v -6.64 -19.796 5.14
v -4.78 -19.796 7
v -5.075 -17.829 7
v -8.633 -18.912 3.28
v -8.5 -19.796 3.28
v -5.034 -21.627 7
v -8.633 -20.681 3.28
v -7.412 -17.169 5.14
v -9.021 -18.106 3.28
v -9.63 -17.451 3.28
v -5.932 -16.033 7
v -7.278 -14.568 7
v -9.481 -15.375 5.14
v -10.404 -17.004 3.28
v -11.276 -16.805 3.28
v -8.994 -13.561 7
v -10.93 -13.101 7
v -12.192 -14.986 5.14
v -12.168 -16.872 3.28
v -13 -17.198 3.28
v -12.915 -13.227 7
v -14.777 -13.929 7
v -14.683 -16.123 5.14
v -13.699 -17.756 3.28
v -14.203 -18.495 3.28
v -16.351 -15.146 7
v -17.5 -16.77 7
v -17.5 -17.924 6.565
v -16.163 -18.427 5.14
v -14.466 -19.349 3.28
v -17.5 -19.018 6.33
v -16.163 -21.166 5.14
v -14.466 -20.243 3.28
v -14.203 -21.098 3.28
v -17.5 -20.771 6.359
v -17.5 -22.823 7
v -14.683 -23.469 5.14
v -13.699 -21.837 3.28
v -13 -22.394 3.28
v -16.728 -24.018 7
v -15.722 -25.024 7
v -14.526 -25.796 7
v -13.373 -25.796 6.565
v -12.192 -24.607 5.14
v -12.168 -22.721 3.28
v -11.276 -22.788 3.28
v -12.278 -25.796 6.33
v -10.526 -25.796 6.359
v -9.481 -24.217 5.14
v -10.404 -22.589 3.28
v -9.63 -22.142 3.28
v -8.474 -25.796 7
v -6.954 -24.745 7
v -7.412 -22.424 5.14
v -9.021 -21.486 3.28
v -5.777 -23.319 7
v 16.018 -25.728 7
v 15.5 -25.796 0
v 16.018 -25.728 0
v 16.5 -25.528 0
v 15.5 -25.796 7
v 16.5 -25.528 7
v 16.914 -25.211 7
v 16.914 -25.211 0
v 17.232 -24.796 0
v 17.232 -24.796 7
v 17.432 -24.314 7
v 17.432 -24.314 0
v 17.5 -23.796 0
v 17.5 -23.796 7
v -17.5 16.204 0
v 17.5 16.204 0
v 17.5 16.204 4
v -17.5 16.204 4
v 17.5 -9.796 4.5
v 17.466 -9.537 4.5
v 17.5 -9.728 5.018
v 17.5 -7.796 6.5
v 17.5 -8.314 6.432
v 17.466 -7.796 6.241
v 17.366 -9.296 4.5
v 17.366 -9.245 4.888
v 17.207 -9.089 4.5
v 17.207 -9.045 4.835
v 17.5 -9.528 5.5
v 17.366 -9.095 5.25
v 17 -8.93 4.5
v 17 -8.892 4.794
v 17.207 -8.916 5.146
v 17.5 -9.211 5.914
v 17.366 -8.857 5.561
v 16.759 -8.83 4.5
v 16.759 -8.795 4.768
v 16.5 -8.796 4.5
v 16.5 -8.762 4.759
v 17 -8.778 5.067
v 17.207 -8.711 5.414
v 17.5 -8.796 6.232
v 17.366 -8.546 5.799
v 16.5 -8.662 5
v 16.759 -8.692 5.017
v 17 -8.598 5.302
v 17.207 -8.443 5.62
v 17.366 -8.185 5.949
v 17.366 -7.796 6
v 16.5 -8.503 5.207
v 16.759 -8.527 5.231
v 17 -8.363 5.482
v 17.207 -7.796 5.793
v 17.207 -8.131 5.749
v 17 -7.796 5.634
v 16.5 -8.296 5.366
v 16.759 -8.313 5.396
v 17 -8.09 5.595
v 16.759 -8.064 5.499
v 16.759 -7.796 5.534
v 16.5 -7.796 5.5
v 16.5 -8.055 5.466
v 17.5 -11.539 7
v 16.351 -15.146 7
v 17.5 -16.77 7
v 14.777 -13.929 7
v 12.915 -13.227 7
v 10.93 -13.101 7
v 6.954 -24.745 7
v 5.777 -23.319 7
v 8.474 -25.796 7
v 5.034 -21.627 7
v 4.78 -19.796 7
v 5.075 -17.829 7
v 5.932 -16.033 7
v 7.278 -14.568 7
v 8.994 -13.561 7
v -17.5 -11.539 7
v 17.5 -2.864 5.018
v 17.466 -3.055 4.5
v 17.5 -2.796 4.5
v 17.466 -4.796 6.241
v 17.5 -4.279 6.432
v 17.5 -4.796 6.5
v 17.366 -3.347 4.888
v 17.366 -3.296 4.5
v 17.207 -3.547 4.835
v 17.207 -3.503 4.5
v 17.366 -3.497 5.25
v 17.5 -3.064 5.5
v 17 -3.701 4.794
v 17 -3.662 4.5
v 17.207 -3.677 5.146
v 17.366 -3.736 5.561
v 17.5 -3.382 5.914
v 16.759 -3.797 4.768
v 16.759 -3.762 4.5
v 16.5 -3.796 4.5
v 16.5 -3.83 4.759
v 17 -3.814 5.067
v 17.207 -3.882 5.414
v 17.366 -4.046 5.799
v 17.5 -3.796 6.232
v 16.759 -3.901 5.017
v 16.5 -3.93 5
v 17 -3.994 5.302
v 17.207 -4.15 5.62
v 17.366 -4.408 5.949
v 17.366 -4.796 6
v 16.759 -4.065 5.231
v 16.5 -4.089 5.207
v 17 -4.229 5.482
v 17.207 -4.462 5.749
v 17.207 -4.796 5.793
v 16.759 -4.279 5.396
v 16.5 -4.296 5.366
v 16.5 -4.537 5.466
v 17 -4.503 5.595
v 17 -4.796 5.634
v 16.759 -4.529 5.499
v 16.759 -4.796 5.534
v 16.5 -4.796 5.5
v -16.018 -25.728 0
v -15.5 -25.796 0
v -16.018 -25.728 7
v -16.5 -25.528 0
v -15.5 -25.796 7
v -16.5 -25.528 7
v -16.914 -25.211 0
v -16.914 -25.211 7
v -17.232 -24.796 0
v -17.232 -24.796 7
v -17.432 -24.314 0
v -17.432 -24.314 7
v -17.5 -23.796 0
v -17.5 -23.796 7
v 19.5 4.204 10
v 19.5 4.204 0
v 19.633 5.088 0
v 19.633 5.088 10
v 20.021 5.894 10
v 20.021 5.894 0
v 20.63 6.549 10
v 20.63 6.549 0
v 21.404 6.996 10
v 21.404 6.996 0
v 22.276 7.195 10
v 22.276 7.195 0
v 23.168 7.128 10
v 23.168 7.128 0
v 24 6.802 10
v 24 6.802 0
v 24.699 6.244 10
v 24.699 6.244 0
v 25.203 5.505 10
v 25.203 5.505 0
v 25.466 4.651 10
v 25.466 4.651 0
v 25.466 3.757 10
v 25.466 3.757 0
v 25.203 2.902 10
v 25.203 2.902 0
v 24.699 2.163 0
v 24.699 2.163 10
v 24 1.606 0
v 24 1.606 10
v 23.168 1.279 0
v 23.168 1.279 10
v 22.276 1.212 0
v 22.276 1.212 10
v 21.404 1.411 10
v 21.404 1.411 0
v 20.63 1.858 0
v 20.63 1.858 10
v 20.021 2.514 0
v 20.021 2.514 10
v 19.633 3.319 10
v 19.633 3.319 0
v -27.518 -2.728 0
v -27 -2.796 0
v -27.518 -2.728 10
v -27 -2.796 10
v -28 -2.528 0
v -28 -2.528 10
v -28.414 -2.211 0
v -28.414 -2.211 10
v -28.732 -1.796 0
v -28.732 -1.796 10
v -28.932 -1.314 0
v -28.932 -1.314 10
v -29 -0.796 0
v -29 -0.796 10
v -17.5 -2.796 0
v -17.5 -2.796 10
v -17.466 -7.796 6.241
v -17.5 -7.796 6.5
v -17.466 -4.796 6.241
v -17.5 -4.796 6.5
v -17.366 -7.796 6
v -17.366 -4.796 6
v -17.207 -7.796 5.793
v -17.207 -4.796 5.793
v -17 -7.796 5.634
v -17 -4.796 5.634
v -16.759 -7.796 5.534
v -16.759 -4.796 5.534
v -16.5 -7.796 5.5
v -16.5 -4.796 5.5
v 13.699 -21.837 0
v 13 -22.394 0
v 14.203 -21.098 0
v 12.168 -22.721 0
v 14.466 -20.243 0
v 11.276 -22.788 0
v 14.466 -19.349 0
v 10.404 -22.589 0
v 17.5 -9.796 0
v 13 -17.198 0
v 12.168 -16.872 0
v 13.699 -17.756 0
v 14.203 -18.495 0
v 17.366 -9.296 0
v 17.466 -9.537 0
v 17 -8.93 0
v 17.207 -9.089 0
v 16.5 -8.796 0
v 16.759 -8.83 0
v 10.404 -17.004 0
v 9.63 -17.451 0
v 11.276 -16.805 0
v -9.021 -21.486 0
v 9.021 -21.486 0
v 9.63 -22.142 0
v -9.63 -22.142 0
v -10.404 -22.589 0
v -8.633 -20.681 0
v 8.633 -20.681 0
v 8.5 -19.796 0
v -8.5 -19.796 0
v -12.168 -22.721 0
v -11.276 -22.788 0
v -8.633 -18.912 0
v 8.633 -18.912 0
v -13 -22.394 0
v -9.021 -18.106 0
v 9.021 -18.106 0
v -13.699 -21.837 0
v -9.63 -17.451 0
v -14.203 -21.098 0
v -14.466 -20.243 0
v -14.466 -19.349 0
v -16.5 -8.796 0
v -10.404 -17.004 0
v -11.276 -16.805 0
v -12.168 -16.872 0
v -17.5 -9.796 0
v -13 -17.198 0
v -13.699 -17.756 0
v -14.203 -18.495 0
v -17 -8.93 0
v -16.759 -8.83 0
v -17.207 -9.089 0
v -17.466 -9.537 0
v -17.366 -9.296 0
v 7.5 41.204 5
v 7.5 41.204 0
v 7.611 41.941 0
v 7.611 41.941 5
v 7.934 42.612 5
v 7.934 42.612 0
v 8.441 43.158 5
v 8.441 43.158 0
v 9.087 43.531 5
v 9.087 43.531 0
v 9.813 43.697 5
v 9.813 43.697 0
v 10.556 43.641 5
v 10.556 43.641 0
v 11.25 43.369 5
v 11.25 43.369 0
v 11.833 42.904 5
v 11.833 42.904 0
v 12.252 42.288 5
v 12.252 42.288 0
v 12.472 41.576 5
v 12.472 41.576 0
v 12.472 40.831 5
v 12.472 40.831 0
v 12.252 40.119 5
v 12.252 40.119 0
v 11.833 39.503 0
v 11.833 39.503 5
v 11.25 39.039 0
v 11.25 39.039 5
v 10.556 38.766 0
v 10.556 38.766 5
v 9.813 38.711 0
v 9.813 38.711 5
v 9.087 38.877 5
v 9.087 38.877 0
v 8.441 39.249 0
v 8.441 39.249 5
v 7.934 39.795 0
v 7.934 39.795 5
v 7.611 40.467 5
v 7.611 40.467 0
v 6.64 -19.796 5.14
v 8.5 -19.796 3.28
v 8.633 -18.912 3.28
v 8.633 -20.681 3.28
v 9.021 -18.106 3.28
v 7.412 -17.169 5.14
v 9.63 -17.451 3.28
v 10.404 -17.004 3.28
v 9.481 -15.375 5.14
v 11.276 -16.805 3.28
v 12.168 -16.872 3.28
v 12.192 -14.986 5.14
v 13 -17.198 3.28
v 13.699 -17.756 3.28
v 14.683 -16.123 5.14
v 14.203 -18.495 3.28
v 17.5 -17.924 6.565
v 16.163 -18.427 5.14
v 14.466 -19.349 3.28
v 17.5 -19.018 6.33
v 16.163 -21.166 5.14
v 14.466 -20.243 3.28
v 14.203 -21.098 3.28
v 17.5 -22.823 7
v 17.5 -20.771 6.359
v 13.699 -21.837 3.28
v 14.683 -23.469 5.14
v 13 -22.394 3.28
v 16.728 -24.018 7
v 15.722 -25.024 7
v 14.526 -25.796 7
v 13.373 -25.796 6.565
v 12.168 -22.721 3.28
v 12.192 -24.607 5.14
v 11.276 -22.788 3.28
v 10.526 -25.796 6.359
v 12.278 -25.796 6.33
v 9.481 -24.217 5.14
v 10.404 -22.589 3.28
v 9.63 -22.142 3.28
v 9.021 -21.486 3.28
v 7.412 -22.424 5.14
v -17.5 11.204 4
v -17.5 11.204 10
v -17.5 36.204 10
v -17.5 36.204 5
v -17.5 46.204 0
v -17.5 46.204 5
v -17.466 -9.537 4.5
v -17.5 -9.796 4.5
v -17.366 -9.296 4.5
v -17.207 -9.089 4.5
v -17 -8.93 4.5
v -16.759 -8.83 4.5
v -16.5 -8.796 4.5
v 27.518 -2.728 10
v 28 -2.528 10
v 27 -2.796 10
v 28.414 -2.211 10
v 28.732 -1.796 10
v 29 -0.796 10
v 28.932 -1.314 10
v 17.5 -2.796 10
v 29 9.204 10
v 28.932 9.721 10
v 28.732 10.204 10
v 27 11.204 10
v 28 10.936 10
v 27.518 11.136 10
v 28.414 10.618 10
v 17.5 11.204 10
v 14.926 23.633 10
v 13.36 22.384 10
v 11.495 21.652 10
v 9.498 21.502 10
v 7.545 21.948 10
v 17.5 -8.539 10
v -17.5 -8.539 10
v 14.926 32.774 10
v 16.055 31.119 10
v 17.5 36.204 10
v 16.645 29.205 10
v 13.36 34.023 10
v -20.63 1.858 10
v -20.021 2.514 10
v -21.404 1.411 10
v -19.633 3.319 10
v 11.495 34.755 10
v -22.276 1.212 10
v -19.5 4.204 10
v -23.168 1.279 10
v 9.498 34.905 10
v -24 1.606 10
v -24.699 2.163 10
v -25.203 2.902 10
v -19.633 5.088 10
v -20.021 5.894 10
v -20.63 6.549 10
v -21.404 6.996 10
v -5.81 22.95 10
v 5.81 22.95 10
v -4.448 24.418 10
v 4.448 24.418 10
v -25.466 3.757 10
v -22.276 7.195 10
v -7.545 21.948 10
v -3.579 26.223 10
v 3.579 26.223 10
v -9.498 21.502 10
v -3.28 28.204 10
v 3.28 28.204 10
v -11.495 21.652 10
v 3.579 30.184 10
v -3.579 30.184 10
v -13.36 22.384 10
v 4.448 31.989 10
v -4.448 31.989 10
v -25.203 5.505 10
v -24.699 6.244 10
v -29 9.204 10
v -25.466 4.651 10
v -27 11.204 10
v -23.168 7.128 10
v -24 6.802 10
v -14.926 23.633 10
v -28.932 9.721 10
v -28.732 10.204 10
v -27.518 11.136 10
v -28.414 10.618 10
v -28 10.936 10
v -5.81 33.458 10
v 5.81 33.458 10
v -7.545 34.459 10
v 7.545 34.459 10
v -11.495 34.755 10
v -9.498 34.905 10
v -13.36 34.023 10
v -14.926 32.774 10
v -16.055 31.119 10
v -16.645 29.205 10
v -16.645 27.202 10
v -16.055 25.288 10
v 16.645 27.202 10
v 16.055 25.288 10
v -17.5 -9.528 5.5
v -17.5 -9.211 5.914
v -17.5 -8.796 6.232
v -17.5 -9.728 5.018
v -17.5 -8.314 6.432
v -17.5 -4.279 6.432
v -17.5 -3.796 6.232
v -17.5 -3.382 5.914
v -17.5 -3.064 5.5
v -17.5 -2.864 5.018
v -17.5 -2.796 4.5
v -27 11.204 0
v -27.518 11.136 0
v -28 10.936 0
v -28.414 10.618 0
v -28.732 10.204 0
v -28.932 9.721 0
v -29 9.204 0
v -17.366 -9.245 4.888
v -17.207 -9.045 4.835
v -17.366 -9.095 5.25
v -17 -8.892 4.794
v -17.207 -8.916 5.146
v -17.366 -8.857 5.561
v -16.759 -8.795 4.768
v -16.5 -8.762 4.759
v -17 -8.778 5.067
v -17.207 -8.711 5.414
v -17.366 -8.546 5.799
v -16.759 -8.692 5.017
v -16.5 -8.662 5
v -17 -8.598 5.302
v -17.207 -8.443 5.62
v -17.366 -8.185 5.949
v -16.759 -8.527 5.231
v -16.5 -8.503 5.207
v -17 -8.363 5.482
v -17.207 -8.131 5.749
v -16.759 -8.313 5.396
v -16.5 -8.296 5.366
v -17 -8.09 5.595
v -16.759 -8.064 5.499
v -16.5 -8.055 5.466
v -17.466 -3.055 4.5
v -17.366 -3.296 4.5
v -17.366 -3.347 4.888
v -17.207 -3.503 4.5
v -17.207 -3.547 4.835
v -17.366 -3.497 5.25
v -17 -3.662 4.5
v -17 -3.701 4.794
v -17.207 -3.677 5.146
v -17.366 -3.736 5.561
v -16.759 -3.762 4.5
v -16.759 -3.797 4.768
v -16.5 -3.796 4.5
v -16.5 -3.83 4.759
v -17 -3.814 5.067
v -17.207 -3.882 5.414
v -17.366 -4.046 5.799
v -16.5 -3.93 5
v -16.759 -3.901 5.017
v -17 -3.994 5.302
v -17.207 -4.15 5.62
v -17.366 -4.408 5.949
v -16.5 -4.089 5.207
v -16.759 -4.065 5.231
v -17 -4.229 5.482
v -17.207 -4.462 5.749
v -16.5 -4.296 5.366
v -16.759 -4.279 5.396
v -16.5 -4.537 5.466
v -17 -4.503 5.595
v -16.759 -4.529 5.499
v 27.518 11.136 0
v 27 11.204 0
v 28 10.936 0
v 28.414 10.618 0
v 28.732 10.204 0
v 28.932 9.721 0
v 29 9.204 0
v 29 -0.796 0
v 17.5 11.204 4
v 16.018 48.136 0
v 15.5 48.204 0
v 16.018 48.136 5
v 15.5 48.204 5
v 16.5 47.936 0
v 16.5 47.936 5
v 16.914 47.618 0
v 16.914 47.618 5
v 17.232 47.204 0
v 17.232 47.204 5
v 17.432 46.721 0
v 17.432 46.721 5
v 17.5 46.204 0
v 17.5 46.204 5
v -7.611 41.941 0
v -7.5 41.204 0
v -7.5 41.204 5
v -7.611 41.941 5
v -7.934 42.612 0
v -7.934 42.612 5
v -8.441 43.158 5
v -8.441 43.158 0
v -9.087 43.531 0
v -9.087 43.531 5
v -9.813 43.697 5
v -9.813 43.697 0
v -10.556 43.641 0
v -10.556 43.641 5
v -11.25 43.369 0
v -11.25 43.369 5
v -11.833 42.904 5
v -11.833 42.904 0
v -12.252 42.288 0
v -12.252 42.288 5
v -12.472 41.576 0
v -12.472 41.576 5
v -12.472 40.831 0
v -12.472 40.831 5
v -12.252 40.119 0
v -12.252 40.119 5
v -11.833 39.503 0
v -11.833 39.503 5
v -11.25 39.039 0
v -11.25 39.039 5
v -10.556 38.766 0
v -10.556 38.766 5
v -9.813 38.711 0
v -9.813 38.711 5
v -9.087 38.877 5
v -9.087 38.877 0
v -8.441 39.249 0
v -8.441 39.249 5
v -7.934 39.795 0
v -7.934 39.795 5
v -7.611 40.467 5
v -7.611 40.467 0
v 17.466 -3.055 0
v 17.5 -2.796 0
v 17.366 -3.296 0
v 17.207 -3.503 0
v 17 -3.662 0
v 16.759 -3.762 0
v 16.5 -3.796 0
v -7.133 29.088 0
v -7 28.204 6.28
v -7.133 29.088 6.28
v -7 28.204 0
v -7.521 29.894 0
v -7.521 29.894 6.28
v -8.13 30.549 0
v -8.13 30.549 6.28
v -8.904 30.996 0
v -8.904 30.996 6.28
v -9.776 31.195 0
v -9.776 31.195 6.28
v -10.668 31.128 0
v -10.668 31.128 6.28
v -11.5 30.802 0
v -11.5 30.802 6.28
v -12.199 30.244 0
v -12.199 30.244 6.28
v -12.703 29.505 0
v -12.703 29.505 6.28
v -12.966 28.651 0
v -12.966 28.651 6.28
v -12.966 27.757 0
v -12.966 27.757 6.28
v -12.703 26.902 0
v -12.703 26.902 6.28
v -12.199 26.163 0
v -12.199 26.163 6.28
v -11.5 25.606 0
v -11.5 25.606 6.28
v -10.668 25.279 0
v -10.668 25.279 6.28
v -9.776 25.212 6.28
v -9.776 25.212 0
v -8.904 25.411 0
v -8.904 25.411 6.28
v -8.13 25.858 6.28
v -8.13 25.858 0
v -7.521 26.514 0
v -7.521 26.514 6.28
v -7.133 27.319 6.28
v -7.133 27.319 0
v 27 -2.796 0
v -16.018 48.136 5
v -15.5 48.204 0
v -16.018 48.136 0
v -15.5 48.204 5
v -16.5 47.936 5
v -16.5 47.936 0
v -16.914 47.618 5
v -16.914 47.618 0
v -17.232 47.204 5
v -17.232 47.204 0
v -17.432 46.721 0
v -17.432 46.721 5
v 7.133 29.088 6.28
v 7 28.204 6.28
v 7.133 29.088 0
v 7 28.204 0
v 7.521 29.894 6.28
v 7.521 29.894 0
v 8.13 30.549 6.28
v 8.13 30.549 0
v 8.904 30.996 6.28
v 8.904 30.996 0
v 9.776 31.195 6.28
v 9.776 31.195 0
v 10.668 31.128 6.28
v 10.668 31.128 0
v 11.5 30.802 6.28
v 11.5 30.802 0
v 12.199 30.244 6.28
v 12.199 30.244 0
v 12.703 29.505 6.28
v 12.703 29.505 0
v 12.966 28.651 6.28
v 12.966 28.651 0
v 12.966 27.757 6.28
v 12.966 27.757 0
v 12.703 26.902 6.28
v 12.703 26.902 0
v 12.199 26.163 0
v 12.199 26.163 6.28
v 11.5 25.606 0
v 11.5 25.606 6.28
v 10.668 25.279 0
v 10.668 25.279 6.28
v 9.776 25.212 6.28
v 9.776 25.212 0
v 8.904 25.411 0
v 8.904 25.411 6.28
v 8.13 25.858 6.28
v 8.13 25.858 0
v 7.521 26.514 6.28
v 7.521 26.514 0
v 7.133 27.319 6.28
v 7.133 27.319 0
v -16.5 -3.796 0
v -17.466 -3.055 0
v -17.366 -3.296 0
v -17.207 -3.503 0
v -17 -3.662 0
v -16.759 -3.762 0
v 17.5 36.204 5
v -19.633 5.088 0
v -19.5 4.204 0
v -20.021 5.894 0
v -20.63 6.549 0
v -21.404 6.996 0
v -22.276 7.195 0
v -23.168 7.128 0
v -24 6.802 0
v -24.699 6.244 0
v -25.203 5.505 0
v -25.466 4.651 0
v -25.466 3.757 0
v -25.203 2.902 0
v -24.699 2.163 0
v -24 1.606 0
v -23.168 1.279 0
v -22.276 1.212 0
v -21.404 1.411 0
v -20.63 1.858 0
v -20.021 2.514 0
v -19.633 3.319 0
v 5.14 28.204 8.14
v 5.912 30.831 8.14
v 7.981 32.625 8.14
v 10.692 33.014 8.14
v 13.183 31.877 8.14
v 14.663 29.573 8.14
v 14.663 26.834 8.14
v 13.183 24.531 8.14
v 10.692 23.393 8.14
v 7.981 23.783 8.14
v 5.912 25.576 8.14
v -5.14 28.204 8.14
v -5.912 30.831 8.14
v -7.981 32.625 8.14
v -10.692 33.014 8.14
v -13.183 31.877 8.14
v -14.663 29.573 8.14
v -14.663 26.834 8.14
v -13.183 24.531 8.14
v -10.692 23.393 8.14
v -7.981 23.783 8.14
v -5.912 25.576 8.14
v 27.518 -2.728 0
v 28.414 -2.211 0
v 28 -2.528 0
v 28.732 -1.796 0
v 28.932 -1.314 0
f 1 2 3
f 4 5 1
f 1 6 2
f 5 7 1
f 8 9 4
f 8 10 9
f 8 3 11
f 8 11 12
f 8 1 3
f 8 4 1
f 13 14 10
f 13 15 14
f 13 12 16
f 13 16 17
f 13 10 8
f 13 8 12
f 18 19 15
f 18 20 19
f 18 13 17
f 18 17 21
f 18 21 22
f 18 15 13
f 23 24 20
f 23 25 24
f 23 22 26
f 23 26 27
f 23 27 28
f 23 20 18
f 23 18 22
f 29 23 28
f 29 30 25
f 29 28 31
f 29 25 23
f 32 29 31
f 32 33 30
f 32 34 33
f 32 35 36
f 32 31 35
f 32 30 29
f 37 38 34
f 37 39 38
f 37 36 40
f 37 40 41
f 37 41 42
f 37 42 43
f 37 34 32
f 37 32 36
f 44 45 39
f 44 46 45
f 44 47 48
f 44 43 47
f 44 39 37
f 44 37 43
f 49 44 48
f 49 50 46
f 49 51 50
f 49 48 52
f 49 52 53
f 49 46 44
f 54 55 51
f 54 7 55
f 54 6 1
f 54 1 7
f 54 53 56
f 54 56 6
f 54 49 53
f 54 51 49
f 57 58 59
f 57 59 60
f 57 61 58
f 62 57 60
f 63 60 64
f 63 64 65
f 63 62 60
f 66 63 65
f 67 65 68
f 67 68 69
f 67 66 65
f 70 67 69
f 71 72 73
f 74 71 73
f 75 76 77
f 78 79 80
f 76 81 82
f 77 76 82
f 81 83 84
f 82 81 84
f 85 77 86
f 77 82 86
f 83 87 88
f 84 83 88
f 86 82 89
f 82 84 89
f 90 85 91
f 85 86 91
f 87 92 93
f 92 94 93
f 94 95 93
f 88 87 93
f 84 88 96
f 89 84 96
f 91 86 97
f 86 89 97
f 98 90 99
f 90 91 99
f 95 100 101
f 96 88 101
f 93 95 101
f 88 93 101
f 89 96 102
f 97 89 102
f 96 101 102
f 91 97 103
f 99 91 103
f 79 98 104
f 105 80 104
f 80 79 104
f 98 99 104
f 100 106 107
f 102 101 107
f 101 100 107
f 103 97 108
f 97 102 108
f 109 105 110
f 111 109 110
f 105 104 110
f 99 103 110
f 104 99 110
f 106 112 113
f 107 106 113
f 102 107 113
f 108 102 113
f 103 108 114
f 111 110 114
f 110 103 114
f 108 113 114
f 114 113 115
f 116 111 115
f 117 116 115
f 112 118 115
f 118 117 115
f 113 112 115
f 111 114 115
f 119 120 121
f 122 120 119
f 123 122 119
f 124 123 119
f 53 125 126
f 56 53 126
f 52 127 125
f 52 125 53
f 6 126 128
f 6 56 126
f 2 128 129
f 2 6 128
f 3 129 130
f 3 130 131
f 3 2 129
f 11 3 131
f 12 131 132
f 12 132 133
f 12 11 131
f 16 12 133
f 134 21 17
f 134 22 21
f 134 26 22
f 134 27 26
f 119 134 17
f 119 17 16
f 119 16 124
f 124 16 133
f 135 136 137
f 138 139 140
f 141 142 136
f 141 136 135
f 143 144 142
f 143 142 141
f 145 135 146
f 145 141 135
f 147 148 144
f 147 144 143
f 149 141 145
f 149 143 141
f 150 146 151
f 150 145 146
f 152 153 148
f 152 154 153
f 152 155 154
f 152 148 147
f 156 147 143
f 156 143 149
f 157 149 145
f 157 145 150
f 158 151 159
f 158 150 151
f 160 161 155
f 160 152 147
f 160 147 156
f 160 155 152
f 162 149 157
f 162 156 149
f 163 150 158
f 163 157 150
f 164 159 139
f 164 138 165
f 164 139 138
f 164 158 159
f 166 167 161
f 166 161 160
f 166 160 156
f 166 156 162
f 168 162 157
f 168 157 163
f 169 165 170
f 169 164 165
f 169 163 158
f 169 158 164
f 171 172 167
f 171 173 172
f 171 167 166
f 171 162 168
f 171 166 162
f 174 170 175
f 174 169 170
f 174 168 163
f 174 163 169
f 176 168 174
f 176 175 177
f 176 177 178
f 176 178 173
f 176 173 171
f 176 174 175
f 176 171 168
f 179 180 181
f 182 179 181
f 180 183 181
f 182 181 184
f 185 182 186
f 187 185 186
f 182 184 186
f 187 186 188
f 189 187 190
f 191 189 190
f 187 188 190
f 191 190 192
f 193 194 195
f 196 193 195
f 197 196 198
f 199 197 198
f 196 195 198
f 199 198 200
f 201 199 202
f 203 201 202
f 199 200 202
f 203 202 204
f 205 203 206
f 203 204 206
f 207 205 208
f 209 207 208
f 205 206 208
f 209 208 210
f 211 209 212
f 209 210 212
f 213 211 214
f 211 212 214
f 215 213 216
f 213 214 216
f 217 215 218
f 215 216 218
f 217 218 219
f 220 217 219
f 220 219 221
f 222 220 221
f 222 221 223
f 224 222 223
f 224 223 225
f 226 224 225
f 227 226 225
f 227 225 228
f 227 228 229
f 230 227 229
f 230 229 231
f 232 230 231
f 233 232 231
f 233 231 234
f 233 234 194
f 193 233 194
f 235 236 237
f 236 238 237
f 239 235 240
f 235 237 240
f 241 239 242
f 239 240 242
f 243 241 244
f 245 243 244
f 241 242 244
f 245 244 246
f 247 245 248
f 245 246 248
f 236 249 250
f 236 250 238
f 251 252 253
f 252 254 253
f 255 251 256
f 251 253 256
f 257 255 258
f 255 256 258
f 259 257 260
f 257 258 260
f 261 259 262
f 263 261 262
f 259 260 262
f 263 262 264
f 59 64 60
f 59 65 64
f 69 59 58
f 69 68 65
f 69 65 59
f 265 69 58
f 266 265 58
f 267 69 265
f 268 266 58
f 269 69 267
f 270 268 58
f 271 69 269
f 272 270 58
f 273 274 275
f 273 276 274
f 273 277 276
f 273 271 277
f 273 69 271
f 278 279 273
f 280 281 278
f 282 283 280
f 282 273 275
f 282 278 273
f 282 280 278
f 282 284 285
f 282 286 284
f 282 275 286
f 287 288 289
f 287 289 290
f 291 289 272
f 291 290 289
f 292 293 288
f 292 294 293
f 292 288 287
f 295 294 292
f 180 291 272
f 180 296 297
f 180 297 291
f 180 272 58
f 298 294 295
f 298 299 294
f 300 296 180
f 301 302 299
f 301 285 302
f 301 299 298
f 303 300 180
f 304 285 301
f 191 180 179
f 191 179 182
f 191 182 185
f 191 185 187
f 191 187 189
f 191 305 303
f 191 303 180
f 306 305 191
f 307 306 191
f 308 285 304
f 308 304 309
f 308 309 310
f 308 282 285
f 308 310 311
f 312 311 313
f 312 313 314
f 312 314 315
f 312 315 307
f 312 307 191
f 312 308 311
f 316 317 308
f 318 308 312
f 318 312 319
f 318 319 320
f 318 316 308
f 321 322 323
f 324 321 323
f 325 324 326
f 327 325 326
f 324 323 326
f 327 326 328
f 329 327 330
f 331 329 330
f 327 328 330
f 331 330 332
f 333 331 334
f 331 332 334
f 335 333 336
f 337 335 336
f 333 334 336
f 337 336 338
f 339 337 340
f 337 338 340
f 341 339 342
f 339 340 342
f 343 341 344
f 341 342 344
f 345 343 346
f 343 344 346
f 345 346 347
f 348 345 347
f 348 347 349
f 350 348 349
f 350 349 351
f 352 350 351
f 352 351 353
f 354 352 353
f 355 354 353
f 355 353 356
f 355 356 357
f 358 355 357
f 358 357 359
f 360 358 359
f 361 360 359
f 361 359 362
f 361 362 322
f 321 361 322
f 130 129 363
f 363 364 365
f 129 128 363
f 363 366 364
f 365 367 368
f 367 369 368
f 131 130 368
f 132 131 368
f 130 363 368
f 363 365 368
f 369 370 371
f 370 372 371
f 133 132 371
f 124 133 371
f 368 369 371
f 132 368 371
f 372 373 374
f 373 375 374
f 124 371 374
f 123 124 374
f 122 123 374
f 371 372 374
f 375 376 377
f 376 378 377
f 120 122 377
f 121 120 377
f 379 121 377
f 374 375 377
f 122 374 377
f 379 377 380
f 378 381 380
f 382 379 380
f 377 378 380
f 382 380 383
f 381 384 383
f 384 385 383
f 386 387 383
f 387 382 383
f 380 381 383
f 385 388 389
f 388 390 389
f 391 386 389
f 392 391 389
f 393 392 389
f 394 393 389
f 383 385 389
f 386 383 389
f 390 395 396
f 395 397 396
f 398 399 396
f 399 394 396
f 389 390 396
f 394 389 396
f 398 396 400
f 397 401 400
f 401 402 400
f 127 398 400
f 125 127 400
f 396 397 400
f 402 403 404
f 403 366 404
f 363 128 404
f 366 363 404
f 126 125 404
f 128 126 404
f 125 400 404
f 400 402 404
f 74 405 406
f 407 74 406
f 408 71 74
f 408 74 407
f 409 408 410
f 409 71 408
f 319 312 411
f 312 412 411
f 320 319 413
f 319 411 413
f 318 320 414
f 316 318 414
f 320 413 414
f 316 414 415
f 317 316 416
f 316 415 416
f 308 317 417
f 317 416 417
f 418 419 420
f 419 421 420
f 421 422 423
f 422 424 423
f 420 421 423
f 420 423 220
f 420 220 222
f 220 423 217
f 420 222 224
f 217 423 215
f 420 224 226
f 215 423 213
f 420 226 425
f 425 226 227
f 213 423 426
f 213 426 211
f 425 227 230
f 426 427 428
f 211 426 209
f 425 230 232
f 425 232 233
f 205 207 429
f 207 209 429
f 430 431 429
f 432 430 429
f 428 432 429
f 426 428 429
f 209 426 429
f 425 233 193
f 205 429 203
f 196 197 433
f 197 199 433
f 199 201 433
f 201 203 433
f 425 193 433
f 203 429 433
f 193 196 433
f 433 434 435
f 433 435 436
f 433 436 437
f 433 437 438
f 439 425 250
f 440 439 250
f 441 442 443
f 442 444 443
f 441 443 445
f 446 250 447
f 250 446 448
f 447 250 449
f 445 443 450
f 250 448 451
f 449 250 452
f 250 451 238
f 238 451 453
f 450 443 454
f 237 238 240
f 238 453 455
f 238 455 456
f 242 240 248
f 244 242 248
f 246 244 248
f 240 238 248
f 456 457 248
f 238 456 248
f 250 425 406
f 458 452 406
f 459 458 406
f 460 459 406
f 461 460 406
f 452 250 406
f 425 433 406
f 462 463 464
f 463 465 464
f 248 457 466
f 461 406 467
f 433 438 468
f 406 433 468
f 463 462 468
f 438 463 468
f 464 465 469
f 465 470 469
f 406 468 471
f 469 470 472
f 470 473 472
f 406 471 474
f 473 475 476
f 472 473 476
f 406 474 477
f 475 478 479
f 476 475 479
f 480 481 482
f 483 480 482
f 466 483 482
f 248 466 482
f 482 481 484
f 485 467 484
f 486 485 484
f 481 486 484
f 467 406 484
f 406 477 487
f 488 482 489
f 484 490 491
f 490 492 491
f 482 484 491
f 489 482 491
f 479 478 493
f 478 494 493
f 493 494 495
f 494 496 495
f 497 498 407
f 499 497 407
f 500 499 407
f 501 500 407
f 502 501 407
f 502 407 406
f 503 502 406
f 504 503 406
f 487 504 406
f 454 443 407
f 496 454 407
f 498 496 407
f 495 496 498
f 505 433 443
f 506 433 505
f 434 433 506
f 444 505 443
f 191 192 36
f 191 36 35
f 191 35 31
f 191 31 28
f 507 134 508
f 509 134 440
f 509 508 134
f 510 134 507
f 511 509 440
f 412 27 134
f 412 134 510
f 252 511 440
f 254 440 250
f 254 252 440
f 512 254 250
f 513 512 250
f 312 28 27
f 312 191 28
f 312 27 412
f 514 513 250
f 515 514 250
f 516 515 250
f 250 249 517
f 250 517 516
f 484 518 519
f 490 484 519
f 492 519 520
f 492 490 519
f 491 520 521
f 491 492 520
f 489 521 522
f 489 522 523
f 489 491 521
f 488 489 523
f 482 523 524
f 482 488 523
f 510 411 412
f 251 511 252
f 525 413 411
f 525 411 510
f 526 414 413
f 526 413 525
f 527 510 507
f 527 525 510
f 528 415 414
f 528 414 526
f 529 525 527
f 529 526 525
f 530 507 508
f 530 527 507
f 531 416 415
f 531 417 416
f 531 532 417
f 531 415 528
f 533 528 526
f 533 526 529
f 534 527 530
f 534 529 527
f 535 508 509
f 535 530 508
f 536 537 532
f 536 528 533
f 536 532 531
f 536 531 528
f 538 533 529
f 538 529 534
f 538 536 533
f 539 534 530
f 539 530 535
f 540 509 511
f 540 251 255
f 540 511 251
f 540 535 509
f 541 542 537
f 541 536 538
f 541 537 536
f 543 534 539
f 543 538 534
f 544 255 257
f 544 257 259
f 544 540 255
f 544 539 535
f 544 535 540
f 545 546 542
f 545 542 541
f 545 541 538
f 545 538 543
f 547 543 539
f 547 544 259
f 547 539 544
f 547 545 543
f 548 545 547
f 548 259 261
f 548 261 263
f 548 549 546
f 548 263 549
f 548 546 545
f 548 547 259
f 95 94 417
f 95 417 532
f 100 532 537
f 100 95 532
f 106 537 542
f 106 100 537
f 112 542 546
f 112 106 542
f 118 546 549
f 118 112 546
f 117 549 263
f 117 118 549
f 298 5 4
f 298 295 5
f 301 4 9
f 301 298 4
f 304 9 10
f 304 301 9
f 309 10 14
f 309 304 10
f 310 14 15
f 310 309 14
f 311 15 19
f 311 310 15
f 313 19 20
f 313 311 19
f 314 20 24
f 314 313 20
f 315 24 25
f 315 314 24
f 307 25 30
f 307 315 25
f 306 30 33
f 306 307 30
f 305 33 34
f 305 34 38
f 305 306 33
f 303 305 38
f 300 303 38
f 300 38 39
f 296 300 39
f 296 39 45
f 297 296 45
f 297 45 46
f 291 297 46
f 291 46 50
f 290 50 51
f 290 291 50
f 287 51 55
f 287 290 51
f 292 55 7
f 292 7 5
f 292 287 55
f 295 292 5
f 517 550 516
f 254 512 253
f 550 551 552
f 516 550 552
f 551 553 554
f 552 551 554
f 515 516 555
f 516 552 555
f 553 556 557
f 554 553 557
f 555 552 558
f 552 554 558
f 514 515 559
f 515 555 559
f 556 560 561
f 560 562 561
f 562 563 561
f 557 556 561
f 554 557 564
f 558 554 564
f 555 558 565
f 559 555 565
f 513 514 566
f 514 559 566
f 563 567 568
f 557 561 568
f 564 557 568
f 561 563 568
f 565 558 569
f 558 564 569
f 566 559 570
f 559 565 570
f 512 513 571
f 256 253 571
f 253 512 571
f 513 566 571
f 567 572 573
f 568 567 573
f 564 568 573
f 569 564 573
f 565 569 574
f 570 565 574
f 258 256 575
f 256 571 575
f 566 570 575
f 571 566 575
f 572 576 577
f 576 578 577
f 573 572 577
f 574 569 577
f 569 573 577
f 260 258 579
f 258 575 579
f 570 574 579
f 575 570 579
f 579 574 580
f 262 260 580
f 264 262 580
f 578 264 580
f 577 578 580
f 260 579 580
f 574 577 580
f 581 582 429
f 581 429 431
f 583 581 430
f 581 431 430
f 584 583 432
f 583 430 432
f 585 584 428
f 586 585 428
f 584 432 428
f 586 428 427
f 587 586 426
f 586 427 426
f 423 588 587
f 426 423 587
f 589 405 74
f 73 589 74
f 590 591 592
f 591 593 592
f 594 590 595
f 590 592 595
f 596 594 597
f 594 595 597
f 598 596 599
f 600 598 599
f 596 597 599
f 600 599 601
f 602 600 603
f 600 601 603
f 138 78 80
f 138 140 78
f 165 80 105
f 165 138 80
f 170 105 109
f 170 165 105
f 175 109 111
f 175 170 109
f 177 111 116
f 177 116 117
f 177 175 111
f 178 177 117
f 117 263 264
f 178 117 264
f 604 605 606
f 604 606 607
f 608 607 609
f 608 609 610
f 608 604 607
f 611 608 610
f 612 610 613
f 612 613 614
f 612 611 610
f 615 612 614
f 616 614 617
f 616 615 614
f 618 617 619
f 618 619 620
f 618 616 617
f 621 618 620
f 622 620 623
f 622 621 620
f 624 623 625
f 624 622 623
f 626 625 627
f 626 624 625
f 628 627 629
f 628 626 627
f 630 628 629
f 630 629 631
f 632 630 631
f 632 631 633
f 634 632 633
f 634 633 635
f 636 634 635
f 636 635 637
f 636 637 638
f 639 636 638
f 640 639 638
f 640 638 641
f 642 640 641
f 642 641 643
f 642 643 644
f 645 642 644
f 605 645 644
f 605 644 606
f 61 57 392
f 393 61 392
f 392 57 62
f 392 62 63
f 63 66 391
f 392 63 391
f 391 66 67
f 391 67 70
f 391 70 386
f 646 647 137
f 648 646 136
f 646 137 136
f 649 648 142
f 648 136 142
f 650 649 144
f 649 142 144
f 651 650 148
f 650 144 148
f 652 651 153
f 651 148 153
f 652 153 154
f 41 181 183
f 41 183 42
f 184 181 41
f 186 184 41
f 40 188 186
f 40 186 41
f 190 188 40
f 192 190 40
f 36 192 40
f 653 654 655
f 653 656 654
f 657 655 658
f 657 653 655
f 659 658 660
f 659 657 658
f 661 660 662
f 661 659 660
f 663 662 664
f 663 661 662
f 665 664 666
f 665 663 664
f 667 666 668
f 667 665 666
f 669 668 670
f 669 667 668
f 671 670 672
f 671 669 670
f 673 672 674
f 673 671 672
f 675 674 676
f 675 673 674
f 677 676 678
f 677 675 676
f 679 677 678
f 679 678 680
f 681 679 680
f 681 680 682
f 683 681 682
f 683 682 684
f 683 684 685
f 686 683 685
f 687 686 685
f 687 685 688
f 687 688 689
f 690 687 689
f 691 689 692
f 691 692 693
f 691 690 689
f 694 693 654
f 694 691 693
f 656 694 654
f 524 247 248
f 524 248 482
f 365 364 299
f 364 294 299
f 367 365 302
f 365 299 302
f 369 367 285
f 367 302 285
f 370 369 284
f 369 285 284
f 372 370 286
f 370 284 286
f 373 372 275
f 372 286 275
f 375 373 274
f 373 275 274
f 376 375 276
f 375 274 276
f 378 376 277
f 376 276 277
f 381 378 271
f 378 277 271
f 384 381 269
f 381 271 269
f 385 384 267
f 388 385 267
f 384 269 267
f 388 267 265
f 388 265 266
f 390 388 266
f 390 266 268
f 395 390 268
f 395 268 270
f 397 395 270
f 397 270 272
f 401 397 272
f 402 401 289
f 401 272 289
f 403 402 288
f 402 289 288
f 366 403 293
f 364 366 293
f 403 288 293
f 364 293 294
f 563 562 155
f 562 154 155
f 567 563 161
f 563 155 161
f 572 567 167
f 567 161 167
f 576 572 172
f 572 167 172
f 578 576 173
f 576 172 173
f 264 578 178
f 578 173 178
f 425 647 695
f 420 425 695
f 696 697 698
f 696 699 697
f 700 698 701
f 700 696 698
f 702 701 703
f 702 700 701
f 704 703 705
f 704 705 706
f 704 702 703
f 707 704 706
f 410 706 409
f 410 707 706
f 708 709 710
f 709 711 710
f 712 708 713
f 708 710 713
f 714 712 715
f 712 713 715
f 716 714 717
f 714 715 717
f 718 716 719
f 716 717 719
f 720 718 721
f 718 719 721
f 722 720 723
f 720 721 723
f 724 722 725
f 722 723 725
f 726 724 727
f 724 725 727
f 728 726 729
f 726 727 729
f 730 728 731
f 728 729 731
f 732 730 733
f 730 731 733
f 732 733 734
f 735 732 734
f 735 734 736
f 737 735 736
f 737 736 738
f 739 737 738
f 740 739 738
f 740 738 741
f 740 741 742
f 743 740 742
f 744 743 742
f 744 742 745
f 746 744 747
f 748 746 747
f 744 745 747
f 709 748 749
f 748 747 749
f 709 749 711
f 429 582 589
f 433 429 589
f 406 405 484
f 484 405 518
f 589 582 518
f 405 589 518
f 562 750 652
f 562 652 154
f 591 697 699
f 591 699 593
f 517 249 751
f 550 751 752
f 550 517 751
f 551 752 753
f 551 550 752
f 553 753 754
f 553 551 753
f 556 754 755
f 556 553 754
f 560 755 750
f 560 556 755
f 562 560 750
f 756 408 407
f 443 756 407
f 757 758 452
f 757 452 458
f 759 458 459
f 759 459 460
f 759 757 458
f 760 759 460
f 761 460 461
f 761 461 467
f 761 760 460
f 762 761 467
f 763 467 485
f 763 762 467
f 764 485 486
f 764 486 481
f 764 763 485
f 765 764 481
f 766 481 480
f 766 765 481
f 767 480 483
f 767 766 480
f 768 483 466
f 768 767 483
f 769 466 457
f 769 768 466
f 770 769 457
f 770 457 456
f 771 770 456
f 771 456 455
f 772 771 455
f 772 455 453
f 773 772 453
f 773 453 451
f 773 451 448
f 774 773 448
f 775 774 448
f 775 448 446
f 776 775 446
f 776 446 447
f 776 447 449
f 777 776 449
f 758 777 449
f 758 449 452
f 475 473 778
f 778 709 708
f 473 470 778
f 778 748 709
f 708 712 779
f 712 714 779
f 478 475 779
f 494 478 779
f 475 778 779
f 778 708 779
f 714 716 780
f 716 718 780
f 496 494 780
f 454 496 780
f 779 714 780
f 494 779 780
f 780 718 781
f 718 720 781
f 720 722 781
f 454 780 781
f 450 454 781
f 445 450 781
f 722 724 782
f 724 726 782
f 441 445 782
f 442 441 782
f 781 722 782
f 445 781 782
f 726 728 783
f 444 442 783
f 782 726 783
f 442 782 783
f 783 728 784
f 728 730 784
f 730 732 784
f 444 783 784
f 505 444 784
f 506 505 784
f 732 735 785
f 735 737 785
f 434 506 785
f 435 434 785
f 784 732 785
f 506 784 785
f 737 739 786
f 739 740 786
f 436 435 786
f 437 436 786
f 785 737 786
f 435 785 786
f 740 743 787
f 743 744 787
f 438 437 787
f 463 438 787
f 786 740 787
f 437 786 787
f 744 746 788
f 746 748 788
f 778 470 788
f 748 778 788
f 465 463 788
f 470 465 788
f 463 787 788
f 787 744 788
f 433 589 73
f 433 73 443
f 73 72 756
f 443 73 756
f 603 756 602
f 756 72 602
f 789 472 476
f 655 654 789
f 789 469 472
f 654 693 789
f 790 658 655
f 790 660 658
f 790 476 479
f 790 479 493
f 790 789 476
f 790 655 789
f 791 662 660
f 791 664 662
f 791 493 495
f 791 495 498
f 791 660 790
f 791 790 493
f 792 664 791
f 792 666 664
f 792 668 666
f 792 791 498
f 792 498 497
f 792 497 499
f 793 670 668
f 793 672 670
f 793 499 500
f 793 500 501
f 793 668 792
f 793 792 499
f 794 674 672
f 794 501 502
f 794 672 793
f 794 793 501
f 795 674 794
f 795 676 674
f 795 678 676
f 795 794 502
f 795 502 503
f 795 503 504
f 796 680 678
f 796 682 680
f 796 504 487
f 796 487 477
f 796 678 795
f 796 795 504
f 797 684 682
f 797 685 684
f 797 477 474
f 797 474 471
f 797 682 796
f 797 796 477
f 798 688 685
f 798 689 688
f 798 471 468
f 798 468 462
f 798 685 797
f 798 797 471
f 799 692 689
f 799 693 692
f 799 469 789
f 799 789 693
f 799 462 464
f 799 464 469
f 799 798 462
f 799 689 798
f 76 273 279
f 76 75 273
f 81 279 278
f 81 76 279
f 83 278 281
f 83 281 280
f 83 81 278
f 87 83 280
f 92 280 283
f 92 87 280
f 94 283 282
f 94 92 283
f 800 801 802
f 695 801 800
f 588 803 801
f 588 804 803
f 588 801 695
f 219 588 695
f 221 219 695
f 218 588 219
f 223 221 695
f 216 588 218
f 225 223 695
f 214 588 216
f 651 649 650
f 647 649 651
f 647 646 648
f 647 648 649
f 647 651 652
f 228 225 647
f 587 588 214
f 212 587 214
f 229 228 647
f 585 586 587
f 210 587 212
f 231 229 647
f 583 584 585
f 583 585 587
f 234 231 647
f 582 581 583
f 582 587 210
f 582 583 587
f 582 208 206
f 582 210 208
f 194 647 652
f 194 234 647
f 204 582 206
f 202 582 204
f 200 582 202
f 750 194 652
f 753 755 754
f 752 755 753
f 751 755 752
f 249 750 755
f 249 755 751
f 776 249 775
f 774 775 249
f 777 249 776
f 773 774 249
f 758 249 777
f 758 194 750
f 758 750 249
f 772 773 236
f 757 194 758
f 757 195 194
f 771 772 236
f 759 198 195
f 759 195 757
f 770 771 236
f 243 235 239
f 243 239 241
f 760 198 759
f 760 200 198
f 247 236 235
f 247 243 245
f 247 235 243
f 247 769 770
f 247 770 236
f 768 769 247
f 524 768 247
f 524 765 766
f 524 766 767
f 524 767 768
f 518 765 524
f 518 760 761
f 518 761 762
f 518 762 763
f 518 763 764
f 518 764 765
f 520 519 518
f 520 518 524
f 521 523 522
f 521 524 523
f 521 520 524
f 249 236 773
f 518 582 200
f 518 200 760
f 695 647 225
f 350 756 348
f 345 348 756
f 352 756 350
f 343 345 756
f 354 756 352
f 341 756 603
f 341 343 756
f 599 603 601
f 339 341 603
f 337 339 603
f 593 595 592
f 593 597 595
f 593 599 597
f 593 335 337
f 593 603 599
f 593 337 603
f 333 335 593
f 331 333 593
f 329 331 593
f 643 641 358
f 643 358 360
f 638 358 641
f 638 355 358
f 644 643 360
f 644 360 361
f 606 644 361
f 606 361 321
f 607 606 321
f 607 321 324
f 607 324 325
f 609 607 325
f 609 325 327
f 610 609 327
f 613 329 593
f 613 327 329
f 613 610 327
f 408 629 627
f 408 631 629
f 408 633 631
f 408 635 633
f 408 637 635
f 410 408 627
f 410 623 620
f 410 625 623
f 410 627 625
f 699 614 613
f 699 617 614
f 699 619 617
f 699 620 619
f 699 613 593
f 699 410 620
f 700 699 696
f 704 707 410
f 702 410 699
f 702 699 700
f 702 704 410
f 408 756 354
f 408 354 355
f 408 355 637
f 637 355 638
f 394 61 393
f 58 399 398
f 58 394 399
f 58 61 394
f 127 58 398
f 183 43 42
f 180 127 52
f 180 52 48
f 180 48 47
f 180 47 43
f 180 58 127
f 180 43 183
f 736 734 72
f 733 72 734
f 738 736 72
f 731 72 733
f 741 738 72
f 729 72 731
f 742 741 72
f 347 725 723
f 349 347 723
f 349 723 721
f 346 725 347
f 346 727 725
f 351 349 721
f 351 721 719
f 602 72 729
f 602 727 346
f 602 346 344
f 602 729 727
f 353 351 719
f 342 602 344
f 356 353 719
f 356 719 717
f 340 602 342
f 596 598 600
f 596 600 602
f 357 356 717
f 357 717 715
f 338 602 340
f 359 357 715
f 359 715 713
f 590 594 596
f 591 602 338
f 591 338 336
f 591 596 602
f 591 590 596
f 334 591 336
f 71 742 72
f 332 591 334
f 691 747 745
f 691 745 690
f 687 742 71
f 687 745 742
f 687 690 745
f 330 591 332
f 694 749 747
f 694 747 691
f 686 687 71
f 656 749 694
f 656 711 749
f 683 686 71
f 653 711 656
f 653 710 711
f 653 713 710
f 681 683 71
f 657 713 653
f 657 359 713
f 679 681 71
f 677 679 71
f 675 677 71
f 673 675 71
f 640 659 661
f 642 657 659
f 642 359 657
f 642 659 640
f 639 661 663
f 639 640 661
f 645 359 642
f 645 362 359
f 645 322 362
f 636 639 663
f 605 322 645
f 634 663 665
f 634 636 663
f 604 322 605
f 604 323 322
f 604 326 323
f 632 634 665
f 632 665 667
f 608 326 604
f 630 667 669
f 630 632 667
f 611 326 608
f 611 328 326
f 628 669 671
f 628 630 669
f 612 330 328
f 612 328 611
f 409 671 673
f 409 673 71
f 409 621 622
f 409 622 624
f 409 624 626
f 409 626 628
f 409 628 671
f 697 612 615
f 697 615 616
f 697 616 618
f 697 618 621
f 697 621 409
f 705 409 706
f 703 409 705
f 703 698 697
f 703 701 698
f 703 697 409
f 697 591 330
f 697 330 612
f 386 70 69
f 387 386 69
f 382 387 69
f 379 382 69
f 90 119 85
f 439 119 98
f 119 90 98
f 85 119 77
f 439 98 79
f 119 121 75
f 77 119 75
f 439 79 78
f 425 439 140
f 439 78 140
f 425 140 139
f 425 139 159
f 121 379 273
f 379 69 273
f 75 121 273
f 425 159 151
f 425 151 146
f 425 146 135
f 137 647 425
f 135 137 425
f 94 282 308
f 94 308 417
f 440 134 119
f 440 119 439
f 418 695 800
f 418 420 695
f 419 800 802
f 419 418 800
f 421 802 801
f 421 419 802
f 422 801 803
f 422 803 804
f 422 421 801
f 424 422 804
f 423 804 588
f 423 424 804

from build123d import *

# Parameters (mm, degrees)
F0_W            = 11.5
F0_H            = 14
F1_DEPTH        = 10
F2_W            = 5
F2_H            = 5.5
F2_H_2          = 4
F2_W_2          = 12
F2_H_3          = 5
F3_DEPTH        = 17.501
F7_D            = 5
F8_D            = 6
F9_D            = 6
F9_CSINK_D      = 13.44
F9_CSINK_ANGLE  = 90
F11_D           = 6
F11_CSINK_D     = 13.44
F11_CSINK_ANGLE = 90
F12_R           = 2
F13_R           = 0.99999


# Not quite as in the source:
# - a fillet or chamfer is up to 0.001 mm smaller than in the source, because OpenCascade refuses the exact size


with BuildPart() as f1:
    # F0 (on Top) → F1 (new body)
    with BuildSketch(Plane.XY):
        with Locations((23.25, 4.2037045646)):
            Rectangle(F0_W, F0_H)
        Polygon((17.5, 48.2037045646), (0, 48.2037045646), (0, -25.7962954354), (17.5, -25.7962954354), (17.5, -2.7962954354), (17.5, 11.2037045646), align=None)
    extrude(amount=F1_DEPTH)

    # F2 (on face) → F3 (cut, through all)
    with BuildSketch(Plane.YZ.offset(17.5)):
        Polygon((-25.7962954354, 10), (-25.7962954354, 7), (-11.5389361225, 7), (-8.5389361225, 10), align=None)
        with Locations((-6.2962954354, 2.75)):
            Rectangle(F2_W, F2_H)
        with Locations((13.7037045646, 2)):
            Rectangle(F2_W, F2_H_2)
        with Locations((42.2037045646, 7.5)):
            Rectangle(F2_W_2, F2_H_3)
    extrude(amount=-F3_DEPTH, mode=Mode.SUBTRACT)

    # F7 (through all)
    with Locations(Plane.XY.offset(5)):
        with Locations((10, 41.2037045646)):
            Hole(F7_D / 2)

    # F8 (through all)
    with Locations(Plane.XY.offset(10)):
        with Locations((22.5, 4.2037045646)):
            Hole(F8_D / 2)

    # F9 (through all)
    with Locations(Plane.XY.offset(7)):
        with Locations((11.5, -19.7962954354)):
            CounterSinkHole(F9_D / 2, F9_CSINK_D / 2, counter_sink_angle=F9_CSINK_ANGLE)

    # F11 (through all)
    with Locations(Plane.XY.offset(10)):
        with Locations((10, 28.2037045646)):
            CounterSinkHole(F11_D / 2, F11_CSINK_D / 2, counter_sink_angle=F11_CSINK_ANGLE)

    # F12
    f12_edges = [f1.edges().sort_by_distance(p)[0] for p in [
        (29, -2.796295, 5),
        (29, 11.203705, 5),
        (17.5, 48.203705, 2.5),
        (17.5, -25.796295, 3.5),
    ]]
    fillet(f12_edges, radius=F12_R)

    # F13 (radius 1 in the source; OpenCascade refuses exactly that, so slightly less here)
    f13_edges = [f1.edges().sort_by_distance(p)[0] for p in [
        (17.5, -6.296295, 5.5),
        (8.75, -3.796295, 5.5),
        (8.75, -8.796295, 5.5),
        (17.5, -8.796295, 2.75),
        (17.5, -3.796295, 2.75),
    ]]
    fillet(f13_edges, radius=F13_R)

    # F14: F1 across face


with BuildPart() as f1_1:
    add(f1.part)
    add(f1.part.mirror(Plane(origin=(0, 11.0999568472, 4.6658308471), x_dir=(0, -1, 0), z_dir=(-1, 0, 0))))


solid = f1_1.part
